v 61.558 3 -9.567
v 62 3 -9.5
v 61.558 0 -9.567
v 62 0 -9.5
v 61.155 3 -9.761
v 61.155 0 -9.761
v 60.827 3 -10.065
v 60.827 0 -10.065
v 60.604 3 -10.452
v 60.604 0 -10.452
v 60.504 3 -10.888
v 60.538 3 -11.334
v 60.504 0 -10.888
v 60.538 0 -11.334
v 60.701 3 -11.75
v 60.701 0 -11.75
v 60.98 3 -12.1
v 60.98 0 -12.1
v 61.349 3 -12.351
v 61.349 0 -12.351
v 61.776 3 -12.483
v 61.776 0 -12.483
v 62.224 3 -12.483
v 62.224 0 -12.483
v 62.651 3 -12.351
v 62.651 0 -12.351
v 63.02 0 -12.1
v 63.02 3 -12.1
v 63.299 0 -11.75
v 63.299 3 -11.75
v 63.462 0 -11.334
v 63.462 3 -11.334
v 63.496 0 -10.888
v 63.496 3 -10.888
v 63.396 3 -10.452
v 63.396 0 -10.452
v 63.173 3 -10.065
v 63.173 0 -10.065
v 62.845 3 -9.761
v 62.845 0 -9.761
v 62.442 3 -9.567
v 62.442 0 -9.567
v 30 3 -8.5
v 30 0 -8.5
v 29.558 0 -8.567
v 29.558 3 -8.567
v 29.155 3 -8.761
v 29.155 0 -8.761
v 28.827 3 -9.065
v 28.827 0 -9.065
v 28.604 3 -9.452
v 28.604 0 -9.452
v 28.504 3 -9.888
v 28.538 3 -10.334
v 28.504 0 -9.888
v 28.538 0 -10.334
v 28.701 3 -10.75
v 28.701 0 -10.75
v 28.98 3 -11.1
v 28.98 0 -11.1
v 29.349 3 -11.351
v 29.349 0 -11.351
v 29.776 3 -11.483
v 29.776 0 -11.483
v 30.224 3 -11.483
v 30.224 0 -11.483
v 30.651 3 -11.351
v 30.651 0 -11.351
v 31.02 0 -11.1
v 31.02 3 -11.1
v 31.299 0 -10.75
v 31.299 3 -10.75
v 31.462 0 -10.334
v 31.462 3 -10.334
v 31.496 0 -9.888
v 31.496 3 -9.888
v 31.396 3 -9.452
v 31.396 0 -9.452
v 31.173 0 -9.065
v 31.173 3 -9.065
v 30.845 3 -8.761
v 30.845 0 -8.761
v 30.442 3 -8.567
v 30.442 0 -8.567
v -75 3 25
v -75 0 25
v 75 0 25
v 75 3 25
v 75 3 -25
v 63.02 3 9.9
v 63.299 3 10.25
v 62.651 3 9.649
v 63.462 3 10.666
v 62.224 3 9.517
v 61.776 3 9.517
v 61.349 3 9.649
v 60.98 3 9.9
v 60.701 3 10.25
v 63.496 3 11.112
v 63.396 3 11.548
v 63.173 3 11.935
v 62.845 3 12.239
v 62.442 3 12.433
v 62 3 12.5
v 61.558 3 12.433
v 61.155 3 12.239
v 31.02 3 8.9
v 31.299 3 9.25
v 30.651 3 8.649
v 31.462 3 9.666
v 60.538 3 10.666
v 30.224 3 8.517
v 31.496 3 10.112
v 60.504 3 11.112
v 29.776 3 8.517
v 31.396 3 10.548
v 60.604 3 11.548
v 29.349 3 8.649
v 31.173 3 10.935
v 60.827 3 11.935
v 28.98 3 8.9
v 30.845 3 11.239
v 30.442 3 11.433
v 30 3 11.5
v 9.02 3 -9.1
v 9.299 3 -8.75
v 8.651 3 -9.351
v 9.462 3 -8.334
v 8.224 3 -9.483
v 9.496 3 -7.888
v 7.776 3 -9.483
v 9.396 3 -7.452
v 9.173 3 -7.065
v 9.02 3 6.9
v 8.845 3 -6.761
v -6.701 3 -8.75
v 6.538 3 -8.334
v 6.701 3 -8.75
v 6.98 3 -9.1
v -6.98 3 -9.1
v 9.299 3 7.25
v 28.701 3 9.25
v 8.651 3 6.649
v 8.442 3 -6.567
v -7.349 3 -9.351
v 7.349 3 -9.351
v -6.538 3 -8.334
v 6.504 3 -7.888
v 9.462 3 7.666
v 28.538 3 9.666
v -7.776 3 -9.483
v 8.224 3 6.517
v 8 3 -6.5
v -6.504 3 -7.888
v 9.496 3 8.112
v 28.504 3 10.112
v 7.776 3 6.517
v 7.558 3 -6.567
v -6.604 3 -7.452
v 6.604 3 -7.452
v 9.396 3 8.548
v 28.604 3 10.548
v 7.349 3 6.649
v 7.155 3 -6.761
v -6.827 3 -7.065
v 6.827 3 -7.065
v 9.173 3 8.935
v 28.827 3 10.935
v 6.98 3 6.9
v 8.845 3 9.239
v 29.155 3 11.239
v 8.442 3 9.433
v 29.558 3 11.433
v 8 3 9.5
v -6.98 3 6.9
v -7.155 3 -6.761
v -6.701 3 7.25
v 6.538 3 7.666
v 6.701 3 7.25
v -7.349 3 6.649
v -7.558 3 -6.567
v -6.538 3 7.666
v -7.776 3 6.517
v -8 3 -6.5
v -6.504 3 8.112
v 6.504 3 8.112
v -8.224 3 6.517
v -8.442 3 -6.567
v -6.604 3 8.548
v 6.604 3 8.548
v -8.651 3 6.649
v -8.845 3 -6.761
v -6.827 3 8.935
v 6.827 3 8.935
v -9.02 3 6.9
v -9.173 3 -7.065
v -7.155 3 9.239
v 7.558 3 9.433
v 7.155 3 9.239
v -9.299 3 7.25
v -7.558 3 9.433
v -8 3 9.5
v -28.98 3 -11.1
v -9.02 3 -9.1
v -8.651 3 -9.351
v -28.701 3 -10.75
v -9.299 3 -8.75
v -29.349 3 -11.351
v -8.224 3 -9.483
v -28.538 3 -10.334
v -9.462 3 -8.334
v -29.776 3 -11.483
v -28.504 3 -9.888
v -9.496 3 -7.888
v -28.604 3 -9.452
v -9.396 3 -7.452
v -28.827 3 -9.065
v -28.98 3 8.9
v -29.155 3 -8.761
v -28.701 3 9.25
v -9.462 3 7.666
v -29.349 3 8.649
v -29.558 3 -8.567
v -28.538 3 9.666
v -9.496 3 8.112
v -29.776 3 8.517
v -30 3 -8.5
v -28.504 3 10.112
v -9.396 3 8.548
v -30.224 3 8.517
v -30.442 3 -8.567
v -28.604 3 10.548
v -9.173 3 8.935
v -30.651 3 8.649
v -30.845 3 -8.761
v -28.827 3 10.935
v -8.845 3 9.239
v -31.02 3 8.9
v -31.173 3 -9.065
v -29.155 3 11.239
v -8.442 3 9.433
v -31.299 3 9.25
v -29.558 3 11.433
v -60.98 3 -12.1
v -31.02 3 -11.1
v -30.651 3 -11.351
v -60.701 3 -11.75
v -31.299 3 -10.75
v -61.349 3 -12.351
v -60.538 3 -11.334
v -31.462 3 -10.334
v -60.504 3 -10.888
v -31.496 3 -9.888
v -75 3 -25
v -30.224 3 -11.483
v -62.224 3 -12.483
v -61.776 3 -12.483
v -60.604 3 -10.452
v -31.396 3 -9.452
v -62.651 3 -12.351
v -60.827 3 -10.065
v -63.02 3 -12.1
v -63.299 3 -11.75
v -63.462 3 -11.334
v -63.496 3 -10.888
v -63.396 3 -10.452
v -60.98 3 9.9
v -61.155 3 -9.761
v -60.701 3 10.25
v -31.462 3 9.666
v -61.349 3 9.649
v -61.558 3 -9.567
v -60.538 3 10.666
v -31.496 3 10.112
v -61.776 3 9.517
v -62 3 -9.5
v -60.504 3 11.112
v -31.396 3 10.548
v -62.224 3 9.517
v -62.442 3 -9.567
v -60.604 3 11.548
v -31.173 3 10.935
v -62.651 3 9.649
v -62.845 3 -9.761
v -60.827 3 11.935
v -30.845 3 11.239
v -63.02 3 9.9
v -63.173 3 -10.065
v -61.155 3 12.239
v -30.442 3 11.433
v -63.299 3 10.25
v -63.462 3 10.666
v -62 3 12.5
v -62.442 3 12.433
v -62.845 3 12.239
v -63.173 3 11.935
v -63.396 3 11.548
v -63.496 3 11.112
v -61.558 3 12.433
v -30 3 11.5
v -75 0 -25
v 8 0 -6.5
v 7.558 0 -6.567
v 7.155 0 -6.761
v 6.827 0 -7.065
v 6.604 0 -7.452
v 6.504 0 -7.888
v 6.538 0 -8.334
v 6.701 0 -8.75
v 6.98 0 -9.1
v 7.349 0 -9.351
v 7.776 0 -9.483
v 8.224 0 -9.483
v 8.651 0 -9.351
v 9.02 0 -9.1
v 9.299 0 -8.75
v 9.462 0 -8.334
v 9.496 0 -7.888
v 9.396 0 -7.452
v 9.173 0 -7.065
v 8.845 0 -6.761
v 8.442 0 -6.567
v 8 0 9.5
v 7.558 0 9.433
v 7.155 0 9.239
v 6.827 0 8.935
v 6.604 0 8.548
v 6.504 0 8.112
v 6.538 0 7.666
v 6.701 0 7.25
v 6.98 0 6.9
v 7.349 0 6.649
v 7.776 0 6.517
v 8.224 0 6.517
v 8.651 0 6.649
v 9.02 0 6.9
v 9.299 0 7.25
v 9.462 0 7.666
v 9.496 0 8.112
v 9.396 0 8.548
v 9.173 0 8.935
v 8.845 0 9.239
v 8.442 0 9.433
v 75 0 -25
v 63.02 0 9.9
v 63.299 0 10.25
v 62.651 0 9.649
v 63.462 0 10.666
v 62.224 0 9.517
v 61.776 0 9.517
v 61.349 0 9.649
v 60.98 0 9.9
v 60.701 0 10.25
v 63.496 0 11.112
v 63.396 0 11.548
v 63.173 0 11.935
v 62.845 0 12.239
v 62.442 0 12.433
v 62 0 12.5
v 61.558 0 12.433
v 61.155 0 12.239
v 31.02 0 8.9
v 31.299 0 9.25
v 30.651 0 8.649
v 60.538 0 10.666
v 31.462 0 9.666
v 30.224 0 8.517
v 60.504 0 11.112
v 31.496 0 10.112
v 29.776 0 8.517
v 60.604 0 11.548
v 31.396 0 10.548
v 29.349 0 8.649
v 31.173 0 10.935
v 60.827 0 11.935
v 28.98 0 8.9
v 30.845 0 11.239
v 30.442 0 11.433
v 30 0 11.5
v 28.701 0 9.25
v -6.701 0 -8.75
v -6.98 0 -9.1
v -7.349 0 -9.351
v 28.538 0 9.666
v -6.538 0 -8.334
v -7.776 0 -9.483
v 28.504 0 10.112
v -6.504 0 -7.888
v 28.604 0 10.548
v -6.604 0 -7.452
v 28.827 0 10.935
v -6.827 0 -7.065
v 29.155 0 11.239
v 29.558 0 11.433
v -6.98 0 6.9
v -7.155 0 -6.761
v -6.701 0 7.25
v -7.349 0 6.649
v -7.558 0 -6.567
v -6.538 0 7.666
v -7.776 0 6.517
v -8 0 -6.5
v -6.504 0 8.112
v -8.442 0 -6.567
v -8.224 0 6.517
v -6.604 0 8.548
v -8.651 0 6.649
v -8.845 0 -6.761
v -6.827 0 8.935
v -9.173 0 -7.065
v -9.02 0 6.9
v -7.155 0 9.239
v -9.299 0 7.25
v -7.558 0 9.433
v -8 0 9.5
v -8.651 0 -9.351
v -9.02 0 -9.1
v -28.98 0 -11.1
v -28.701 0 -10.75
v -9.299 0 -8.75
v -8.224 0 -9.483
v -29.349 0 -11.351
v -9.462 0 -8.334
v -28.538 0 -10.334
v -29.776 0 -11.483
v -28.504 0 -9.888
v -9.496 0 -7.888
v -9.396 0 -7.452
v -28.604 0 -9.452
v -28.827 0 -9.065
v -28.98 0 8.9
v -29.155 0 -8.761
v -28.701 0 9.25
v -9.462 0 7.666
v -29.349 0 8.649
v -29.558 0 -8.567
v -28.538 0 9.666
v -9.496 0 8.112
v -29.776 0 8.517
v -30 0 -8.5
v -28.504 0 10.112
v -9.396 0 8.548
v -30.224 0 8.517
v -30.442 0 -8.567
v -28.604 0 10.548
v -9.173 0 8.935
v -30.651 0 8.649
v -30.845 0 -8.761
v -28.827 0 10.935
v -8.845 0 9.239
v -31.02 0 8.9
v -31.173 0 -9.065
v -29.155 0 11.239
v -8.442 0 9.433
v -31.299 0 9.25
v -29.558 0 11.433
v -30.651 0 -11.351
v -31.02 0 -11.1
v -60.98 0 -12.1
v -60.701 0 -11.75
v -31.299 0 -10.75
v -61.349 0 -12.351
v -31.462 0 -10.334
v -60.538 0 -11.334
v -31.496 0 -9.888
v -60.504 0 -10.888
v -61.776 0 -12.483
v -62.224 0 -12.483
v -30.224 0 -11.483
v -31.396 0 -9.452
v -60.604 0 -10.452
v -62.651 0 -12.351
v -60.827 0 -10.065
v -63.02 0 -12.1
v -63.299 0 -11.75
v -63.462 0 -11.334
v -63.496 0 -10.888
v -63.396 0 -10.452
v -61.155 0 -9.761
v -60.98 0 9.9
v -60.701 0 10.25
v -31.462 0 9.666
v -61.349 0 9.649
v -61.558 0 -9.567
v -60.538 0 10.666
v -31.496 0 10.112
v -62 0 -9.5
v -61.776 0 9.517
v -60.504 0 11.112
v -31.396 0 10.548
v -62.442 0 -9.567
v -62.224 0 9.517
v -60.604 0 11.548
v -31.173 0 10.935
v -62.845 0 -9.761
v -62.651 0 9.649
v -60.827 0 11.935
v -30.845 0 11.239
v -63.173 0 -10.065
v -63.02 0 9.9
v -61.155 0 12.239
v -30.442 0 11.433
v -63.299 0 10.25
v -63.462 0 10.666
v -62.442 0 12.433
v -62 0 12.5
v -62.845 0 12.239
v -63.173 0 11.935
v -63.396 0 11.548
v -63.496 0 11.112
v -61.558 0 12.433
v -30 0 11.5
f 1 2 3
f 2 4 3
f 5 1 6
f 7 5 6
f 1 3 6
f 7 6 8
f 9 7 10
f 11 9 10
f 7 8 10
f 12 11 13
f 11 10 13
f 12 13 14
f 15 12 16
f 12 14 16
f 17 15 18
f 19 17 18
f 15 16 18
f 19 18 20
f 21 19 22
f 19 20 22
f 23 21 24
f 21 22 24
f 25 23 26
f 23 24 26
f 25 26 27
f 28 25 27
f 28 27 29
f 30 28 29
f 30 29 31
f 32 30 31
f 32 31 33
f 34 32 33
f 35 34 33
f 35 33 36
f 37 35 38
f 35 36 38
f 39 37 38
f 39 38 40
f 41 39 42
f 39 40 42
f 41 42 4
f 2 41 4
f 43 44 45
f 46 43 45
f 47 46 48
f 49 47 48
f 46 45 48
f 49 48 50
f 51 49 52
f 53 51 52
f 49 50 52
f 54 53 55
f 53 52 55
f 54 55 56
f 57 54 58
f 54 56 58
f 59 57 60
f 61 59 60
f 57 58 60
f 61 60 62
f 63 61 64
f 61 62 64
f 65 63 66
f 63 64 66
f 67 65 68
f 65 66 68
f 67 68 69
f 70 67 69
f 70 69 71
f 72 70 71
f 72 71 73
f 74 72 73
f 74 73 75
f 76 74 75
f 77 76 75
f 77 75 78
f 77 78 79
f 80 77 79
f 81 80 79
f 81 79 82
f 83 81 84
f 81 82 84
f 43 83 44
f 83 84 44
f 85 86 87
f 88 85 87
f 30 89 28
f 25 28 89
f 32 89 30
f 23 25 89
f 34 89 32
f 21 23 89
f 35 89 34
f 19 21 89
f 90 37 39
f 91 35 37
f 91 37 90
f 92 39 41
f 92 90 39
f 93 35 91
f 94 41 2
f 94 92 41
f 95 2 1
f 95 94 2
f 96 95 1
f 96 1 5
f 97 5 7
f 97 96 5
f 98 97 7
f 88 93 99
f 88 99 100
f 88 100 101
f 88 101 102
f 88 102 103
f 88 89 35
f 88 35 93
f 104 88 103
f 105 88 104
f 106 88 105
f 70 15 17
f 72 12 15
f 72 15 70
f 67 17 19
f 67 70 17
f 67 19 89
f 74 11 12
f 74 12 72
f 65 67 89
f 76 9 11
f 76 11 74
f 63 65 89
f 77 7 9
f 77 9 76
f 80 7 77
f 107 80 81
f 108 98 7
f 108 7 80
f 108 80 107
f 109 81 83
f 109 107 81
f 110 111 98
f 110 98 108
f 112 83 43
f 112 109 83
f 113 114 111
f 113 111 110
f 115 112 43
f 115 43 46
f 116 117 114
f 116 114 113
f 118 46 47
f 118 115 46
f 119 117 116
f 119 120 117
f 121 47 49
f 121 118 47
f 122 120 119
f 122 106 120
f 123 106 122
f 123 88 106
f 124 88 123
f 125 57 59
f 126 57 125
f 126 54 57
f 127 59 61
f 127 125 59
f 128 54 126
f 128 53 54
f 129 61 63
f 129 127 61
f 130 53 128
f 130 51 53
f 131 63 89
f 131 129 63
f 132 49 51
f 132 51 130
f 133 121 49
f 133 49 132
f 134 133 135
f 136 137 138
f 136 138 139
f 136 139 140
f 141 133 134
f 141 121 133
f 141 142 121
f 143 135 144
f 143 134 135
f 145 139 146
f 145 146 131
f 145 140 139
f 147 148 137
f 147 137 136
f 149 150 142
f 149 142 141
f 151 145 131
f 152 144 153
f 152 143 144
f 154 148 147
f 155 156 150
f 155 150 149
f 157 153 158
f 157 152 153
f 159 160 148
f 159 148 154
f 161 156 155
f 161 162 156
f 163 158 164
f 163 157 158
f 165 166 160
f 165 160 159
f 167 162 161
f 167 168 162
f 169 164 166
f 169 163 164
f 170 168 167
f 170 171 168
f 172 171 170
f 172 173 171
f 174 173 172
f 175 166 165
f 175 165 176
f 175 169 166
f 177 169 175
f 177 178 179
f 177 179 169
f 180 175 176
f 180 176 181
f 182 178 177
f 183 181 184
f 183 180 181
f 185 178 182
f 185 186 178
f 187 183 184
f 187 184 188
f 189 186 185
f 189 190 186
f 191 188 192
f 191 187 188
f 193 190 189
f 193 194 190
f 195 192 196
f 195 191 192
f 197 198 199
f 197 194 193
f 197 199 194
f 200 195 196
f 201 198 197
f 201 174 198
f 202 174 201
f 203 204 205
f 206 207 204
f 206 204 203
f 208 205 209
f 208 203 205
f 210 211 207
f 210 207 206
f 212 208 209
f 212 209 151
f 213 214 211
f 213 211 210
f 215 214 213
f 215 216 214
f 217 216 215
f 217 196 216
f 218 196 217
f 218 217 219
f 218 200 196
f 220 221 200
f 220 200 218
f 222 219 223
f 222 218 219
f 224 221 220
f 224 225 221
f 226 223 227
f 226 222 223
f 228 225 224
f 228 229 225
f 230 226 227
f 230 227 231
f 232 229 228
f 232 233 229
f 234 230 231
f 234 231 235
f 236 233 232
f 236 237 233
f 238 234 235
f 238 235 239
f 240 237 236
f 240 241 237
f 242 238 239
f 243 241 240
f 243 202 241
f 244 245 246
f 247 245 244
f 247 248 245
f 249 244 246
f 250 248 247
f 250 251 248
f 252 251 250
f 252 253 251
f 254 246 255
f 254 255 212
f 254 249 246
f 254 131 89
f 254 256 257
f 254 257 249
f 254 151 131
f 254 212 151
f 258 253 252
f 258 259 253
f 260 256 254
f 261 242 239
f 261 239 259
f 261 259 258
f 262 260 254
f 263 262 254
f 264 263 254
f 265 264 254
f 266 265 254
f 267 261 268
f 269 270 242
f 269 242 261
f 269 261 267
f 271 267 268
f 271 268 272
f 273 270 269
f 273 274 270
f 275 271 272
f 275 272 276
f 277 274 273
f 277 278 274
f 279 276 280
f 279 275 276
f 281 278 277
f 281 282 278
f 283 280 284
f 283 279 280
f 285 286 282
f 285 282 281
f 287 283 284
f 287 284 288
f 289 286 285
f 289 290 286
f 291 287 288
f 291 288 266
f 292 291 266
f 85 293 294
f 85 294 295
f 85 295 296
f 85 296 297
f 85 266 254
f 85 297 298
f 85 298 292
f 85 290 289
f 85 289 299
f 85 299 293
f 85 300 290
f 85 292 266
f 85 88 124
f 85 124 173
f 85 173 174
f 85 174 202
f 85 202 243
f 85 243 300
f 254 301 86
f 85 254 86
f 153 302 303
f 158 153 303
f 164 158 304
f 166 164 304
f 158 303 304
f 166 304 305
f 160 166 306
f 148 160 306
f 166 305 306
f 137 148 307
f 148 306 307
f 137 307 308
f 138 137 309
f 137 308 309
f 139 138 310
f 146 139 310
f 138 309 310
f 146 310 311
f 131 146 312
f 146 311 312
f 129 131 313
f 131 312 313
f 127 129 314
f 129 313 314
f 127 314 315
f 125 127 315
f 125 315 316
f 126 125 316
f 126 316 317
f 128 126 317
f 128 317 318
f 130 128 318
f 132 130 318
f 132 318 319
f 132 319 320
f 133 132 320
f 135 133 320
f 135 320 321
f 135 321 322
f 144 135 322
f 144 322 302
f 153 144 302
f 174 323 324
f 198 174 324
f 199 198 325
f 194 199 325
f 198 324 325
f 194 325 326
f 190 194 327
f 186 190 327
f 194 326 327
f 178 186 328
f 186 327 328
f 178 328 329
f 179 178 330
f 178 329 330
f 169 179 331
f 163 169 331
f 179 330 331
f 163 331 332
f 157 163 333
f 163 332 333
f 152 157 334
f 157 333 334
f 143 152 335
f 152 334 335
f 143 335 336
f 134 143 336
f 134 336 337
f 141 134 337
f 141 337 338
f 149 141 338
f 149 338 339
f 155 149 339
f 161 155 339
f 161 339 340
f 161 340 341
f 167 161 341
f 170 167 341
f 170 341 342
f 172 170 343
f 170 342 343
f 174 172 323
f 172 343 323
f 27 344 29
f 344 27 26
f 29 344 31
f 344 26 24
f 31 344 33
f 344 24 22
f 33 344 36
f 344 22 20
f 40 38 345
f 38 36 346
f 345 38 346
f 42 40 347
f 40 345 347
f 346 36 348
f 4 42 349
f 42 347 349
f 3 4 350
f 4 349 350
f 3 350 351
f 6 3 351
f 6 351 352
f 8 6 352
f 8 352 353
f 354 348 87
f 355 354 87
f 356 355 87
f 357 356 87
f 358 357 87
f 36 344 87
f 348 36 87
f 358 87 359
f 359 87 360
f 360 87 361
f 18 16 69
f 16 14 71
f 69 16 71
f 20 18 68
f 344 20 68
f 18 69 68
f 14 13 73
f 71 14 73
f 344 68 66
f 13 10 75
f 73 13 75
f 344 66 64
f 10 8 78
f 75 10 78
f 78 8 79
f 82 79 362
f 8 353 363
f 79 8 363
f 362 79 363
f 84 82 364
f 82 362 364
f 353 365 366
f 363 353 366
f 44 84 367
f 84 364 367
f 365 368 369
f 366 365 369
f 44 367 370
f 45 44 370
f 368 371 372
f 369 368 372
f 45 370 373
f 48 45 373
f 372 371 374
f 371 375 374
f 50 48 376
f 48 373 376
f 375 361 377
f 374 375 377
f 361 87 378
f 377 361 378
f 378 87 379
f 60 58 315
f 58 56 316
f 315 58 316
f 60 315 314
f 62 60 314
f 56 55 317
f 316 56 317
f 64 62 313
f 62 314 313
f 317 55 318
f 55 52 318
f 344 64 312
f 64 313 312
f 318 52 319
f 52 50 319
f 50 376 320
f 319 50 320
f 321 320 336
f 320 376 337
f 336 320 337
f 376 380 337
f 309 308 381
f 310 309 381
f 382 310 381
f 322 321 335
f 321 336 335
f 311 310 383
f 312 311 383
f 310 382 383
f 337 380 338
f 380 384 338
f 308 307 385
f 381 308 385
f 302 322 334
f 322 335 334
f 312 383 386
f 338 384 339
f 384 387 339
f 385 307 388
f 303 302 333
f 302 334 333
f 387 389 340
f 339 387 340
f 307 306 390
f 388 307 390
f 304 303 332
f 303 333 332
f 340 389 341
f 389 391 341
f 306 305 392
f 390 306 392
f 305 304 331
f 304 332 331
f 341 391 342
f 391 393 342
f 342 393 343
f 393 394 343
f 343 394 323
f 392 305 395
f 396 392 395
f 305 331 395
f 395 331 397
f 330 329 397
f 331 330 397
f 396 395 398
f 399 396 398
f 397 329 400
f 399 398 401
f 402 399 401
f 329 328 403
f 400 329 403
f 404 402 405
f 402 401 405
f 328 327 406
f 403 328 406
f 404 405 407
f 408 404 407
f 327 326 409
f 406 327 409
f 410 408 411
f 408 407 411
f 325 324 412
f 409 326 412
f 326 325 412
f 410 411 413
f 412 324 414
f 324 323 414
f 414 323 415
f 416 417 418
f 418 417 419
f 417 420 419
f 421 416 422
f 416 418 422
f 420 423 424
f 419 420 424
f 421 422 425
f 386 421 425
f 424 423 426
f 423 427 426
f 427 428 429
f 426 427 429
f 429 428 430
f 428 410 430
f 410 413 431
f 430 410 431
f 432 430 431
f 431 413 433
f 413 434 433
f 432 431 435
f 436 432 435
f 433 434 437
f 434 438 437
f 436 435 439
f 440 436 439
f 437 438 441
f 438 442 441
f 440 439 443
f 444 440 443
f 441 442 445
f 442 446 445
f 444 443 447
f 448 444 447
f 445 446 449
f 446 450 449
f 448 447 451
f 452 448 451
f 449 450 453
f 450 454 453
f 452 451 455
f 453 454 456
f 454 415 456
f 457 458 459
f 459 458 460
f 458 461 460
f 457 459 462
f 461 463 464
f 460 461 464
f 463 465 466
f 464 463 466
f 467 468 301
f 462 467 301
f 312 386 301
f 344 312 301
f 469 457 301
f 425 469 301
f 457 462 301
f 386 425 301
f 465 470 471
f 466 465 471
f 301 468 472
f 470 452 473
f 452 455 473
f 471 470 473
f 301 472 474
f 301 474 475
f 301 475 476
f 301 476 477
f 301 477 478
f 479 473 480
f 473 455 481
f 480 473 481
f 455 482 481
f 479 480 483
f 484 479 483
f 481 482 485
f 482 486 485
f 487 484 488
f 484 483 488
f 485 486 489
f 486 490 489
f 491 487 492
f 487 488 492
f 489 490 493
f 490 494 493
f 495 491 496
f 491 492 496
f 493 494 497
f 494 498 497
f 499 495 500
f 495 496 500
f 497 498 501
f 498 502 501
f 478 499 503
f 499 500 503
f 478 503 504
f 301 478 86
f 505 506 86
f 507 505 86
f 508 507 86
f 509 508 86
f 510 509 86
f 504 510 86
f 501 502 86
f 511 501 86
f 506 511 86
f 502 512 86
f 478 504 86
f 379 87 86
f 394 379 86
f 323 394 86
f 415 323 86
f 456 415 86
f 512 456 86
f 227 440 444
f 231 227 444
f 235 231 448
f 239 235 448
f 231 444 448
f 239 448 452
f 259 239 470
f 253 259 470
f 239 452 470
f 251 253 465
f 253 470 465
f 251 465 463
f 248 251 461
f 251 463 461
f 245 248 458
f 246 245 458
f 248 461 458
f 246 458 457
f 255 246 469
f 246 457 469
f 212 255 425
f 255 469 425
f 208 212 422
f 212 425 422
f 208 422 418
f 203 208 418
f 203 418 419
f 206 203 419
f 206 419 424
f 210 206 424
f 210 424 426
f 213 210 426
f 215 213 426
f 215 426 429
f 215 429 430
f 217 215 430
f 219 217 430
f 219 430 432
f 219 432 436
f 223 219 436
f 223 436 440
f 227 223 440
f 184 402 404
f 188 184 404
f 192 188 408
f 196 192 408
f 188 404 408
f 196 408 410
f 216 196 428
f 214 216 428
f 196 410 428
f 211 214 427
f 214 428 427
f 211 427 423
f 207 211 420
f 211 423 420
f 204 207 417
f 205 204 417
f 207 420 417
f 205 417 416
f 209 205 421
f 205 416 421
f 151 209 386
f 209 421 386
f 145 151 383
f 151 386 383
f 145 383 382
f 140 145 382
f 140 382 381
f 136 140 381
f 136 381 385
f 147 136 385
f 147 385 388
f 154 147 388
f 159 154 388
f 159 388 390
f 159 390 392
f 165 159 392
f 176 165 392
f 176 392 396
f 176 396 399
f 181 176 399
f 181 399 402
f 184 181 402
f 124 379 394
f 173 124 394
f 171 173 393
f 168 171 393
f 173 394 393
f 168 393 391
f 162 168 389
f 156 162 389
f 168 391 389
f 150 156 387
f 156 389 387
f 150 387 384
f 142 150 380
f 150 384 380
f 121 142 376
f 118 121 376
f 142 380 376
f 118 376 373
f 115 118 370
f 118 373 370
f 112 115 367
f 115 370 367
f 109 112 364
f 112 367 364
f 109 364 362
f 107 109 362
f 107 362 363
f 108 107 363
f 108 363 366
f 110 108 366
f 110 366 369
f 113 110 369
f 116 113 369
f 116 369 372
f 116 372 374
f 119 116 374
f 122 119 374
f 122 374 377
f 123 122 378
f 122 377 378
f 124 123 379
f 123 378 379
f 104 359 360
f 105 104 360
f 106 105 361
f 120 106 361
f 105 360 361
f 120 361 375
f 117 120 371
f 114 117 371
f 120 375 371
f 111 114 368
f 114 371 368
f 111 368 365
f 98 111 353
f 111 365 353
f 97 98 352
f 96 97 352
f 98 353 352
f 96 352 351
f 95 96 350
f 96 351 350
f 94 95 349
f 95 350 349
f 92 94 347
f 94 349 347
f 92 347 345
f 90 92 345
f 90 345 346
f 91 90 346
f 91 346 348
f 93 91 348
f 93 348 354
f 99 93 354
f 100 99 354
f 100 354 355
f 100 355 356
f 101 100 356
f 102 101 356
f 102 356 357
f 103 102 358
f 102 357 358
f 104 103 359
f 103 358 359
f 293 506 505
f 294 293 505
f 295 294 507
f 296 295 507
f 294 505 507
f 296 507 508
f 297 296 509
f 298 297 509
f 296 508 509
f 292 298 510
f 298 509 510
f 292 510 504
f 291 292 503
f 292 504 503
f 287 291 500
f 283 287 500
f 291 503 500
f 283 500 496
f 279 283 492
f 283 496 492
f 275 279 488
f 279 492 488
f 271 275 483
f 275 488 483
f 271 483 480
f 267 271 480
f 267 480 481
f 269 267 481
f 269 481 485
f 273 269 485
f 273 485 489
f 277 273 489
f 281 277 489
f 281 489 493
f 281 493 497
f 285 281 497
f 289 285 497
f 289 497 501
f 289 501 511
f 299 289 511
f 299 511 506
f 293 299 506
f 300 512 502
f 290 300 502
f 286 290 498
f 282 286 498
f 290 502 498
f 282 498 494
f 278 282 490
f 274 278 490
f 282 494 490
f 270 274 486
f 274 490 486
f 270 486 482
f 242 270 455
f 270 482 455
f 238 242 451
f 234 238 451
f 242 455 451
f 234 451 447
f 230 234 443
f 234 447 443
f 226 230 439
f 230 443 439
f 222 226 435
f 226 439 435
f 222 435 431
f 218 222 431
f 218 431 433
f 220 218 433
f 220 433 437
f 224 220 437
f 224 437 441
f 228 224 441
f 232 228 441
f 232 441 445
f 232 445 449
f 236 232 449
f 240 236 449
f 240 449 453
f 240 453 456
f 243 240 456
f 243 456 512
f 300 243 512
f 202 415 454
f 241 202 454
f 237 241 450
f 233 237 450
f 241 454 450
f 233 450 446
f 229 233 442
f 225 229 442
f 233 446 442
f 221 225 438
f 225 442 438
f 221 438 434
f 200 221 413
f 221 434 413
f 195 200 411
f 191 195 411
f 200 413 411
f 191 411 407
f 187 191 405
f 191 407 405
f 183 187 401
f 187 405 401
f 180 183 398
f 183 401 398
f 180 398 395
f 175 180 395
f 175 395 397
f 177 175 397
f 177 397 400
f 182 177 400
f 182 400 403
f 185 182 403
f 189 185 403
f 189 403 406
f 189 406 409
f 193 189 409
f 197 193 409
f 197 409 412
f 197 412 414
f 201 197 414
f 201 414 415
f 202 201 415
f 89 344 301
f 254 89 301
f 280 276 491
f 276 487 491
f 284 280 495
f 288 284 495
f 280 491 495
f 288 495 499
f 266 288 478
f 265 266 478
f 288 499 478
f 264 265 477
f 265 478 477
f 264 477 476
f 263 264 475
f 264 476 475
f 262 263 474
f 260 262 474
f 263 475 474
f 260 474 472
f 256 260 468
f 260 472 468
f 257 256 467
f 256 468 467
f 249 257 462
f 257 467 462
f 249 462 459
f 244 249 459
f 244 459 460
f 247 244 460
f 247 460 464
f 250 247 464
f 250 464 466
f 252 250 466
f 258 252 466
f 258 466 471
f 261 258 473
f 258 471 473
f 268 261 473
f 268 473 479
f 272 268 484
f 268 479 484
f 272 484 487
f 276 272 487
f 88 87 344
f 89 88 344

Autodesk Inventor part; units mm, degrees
ref_plane "YZ Plane" through (0, 0, 0) normal (1, 0, 0) x (0, 1, 0)
ref_plane "XZ Plane" through (0, 0, 0) normal (0, 1, 0) x (-1, 0, 0)
ref_plane "XY Plane" through (0, 0, 0) normal (0, 0, 1) x (1, 0, 0)
sketch "Szkic1" plane through (0, 0, 0) normal (0, 1, 0) x (-1, 0, 0)
  line L0 (75, 25) -> (-75, 25)
  line L1 (-75, 25) -> (-75, -25)
  line L2 (-75, -25) -> (75, -25)
  line L3 (75, -25) -> (75, 25)
  line L4 (75, 25) -> (-75, -25) construction
  line L5 (-75, 25) -> (75, -25) construction
  point P0 (0, 0)
  dimension "d0" = 150
  dimension "d1" = 50
extrude "Wyciągnięcie proste1" add sketch "Szkic1" along normal blind 3
sketch "Szkic3" plane through (0, 3, 0) normal (0, 1, 0) x (1, 0, 0)
  line L0 (75, 25) -> (-75, 25) projected
  line L1 (0, 25) -> (0, -25) construction
  line L2 (-75, -25) -> (75, -25) projected
  line L3 (-75, 25) -> (-75, -25) projected
  line L4 (-75, 0) -> (75, 0) construction
  line L5 (75, -25) -> (75, 25) projected
  point P0 (0, 0)
  point P1 (-30, 10)
  point P2 (30, 10)
  point P3 (-30, -10)
  point P4 (30, -10)
  dimension "d16" = 15
  dimension "d43" = 60
hole "Otwór2" at (-30, 3, -10) at (30, 3, -10) at (-30, 3, 10) at (30, 3, 10) direction (0, -1, 0) diameter 3 depth 8 tip angle 118
sketch "Szkic4" plane through (0, 3, 0) normal (0, 1, 0) x (1, 0, 0)
  line L0 (75, -25) -> (75, 25) projected
  line L1 (-75, 25) -> (-75, -25) projected
  line L2 (-75, 0) -> (75, 0) construction
  line L3 (75, 25) -> (-75, 25) projected
  line L4 (0, 25) -> (0, -25) construction
  point P0 (0, 0)
  point P1 (62, 11)
  point P2 (62, -11)
  point P3 (-62, 11)
  point P4 (-62, -11)
  dimension "d24" = 13
  dimension "d25" = 11
hole "Otwór3" at (62, 3, -11) at (62, 3, 11) at (-62, 3, -11) at (-62, 3, 11) direction (0, -1, 0) diameter 3 depth 8 tip angle 118
sketch "Szkic5" plane through (0, 3, 0) normal (0, 1, 0) x (1, 0, 0)
  line L0 (-8, -8) -> (8, -8)
  line L1 (8, -8) -> (8, 8)
  line L2 (8, 8) -> (-8, 8)
  line L3 (-8, 8) -> (-8, -8)
  line L4 (-8, -8) -> (8, 8) construction
  line L5 (8, -8) -> (-8, 8) construction
  point P0 (0, 0)
  dimension "d33" = 16
  dimension "d34" = 16
hole "Otwór4" at (-8, 3, -8) at (8, 3, -8) at (8, 3, 8) at (-8, 3, 8) direction (0, -1, 0) diameter 3 depth 8 tip angle 118
properties part number "Góra" material "Aluminium 6061"
